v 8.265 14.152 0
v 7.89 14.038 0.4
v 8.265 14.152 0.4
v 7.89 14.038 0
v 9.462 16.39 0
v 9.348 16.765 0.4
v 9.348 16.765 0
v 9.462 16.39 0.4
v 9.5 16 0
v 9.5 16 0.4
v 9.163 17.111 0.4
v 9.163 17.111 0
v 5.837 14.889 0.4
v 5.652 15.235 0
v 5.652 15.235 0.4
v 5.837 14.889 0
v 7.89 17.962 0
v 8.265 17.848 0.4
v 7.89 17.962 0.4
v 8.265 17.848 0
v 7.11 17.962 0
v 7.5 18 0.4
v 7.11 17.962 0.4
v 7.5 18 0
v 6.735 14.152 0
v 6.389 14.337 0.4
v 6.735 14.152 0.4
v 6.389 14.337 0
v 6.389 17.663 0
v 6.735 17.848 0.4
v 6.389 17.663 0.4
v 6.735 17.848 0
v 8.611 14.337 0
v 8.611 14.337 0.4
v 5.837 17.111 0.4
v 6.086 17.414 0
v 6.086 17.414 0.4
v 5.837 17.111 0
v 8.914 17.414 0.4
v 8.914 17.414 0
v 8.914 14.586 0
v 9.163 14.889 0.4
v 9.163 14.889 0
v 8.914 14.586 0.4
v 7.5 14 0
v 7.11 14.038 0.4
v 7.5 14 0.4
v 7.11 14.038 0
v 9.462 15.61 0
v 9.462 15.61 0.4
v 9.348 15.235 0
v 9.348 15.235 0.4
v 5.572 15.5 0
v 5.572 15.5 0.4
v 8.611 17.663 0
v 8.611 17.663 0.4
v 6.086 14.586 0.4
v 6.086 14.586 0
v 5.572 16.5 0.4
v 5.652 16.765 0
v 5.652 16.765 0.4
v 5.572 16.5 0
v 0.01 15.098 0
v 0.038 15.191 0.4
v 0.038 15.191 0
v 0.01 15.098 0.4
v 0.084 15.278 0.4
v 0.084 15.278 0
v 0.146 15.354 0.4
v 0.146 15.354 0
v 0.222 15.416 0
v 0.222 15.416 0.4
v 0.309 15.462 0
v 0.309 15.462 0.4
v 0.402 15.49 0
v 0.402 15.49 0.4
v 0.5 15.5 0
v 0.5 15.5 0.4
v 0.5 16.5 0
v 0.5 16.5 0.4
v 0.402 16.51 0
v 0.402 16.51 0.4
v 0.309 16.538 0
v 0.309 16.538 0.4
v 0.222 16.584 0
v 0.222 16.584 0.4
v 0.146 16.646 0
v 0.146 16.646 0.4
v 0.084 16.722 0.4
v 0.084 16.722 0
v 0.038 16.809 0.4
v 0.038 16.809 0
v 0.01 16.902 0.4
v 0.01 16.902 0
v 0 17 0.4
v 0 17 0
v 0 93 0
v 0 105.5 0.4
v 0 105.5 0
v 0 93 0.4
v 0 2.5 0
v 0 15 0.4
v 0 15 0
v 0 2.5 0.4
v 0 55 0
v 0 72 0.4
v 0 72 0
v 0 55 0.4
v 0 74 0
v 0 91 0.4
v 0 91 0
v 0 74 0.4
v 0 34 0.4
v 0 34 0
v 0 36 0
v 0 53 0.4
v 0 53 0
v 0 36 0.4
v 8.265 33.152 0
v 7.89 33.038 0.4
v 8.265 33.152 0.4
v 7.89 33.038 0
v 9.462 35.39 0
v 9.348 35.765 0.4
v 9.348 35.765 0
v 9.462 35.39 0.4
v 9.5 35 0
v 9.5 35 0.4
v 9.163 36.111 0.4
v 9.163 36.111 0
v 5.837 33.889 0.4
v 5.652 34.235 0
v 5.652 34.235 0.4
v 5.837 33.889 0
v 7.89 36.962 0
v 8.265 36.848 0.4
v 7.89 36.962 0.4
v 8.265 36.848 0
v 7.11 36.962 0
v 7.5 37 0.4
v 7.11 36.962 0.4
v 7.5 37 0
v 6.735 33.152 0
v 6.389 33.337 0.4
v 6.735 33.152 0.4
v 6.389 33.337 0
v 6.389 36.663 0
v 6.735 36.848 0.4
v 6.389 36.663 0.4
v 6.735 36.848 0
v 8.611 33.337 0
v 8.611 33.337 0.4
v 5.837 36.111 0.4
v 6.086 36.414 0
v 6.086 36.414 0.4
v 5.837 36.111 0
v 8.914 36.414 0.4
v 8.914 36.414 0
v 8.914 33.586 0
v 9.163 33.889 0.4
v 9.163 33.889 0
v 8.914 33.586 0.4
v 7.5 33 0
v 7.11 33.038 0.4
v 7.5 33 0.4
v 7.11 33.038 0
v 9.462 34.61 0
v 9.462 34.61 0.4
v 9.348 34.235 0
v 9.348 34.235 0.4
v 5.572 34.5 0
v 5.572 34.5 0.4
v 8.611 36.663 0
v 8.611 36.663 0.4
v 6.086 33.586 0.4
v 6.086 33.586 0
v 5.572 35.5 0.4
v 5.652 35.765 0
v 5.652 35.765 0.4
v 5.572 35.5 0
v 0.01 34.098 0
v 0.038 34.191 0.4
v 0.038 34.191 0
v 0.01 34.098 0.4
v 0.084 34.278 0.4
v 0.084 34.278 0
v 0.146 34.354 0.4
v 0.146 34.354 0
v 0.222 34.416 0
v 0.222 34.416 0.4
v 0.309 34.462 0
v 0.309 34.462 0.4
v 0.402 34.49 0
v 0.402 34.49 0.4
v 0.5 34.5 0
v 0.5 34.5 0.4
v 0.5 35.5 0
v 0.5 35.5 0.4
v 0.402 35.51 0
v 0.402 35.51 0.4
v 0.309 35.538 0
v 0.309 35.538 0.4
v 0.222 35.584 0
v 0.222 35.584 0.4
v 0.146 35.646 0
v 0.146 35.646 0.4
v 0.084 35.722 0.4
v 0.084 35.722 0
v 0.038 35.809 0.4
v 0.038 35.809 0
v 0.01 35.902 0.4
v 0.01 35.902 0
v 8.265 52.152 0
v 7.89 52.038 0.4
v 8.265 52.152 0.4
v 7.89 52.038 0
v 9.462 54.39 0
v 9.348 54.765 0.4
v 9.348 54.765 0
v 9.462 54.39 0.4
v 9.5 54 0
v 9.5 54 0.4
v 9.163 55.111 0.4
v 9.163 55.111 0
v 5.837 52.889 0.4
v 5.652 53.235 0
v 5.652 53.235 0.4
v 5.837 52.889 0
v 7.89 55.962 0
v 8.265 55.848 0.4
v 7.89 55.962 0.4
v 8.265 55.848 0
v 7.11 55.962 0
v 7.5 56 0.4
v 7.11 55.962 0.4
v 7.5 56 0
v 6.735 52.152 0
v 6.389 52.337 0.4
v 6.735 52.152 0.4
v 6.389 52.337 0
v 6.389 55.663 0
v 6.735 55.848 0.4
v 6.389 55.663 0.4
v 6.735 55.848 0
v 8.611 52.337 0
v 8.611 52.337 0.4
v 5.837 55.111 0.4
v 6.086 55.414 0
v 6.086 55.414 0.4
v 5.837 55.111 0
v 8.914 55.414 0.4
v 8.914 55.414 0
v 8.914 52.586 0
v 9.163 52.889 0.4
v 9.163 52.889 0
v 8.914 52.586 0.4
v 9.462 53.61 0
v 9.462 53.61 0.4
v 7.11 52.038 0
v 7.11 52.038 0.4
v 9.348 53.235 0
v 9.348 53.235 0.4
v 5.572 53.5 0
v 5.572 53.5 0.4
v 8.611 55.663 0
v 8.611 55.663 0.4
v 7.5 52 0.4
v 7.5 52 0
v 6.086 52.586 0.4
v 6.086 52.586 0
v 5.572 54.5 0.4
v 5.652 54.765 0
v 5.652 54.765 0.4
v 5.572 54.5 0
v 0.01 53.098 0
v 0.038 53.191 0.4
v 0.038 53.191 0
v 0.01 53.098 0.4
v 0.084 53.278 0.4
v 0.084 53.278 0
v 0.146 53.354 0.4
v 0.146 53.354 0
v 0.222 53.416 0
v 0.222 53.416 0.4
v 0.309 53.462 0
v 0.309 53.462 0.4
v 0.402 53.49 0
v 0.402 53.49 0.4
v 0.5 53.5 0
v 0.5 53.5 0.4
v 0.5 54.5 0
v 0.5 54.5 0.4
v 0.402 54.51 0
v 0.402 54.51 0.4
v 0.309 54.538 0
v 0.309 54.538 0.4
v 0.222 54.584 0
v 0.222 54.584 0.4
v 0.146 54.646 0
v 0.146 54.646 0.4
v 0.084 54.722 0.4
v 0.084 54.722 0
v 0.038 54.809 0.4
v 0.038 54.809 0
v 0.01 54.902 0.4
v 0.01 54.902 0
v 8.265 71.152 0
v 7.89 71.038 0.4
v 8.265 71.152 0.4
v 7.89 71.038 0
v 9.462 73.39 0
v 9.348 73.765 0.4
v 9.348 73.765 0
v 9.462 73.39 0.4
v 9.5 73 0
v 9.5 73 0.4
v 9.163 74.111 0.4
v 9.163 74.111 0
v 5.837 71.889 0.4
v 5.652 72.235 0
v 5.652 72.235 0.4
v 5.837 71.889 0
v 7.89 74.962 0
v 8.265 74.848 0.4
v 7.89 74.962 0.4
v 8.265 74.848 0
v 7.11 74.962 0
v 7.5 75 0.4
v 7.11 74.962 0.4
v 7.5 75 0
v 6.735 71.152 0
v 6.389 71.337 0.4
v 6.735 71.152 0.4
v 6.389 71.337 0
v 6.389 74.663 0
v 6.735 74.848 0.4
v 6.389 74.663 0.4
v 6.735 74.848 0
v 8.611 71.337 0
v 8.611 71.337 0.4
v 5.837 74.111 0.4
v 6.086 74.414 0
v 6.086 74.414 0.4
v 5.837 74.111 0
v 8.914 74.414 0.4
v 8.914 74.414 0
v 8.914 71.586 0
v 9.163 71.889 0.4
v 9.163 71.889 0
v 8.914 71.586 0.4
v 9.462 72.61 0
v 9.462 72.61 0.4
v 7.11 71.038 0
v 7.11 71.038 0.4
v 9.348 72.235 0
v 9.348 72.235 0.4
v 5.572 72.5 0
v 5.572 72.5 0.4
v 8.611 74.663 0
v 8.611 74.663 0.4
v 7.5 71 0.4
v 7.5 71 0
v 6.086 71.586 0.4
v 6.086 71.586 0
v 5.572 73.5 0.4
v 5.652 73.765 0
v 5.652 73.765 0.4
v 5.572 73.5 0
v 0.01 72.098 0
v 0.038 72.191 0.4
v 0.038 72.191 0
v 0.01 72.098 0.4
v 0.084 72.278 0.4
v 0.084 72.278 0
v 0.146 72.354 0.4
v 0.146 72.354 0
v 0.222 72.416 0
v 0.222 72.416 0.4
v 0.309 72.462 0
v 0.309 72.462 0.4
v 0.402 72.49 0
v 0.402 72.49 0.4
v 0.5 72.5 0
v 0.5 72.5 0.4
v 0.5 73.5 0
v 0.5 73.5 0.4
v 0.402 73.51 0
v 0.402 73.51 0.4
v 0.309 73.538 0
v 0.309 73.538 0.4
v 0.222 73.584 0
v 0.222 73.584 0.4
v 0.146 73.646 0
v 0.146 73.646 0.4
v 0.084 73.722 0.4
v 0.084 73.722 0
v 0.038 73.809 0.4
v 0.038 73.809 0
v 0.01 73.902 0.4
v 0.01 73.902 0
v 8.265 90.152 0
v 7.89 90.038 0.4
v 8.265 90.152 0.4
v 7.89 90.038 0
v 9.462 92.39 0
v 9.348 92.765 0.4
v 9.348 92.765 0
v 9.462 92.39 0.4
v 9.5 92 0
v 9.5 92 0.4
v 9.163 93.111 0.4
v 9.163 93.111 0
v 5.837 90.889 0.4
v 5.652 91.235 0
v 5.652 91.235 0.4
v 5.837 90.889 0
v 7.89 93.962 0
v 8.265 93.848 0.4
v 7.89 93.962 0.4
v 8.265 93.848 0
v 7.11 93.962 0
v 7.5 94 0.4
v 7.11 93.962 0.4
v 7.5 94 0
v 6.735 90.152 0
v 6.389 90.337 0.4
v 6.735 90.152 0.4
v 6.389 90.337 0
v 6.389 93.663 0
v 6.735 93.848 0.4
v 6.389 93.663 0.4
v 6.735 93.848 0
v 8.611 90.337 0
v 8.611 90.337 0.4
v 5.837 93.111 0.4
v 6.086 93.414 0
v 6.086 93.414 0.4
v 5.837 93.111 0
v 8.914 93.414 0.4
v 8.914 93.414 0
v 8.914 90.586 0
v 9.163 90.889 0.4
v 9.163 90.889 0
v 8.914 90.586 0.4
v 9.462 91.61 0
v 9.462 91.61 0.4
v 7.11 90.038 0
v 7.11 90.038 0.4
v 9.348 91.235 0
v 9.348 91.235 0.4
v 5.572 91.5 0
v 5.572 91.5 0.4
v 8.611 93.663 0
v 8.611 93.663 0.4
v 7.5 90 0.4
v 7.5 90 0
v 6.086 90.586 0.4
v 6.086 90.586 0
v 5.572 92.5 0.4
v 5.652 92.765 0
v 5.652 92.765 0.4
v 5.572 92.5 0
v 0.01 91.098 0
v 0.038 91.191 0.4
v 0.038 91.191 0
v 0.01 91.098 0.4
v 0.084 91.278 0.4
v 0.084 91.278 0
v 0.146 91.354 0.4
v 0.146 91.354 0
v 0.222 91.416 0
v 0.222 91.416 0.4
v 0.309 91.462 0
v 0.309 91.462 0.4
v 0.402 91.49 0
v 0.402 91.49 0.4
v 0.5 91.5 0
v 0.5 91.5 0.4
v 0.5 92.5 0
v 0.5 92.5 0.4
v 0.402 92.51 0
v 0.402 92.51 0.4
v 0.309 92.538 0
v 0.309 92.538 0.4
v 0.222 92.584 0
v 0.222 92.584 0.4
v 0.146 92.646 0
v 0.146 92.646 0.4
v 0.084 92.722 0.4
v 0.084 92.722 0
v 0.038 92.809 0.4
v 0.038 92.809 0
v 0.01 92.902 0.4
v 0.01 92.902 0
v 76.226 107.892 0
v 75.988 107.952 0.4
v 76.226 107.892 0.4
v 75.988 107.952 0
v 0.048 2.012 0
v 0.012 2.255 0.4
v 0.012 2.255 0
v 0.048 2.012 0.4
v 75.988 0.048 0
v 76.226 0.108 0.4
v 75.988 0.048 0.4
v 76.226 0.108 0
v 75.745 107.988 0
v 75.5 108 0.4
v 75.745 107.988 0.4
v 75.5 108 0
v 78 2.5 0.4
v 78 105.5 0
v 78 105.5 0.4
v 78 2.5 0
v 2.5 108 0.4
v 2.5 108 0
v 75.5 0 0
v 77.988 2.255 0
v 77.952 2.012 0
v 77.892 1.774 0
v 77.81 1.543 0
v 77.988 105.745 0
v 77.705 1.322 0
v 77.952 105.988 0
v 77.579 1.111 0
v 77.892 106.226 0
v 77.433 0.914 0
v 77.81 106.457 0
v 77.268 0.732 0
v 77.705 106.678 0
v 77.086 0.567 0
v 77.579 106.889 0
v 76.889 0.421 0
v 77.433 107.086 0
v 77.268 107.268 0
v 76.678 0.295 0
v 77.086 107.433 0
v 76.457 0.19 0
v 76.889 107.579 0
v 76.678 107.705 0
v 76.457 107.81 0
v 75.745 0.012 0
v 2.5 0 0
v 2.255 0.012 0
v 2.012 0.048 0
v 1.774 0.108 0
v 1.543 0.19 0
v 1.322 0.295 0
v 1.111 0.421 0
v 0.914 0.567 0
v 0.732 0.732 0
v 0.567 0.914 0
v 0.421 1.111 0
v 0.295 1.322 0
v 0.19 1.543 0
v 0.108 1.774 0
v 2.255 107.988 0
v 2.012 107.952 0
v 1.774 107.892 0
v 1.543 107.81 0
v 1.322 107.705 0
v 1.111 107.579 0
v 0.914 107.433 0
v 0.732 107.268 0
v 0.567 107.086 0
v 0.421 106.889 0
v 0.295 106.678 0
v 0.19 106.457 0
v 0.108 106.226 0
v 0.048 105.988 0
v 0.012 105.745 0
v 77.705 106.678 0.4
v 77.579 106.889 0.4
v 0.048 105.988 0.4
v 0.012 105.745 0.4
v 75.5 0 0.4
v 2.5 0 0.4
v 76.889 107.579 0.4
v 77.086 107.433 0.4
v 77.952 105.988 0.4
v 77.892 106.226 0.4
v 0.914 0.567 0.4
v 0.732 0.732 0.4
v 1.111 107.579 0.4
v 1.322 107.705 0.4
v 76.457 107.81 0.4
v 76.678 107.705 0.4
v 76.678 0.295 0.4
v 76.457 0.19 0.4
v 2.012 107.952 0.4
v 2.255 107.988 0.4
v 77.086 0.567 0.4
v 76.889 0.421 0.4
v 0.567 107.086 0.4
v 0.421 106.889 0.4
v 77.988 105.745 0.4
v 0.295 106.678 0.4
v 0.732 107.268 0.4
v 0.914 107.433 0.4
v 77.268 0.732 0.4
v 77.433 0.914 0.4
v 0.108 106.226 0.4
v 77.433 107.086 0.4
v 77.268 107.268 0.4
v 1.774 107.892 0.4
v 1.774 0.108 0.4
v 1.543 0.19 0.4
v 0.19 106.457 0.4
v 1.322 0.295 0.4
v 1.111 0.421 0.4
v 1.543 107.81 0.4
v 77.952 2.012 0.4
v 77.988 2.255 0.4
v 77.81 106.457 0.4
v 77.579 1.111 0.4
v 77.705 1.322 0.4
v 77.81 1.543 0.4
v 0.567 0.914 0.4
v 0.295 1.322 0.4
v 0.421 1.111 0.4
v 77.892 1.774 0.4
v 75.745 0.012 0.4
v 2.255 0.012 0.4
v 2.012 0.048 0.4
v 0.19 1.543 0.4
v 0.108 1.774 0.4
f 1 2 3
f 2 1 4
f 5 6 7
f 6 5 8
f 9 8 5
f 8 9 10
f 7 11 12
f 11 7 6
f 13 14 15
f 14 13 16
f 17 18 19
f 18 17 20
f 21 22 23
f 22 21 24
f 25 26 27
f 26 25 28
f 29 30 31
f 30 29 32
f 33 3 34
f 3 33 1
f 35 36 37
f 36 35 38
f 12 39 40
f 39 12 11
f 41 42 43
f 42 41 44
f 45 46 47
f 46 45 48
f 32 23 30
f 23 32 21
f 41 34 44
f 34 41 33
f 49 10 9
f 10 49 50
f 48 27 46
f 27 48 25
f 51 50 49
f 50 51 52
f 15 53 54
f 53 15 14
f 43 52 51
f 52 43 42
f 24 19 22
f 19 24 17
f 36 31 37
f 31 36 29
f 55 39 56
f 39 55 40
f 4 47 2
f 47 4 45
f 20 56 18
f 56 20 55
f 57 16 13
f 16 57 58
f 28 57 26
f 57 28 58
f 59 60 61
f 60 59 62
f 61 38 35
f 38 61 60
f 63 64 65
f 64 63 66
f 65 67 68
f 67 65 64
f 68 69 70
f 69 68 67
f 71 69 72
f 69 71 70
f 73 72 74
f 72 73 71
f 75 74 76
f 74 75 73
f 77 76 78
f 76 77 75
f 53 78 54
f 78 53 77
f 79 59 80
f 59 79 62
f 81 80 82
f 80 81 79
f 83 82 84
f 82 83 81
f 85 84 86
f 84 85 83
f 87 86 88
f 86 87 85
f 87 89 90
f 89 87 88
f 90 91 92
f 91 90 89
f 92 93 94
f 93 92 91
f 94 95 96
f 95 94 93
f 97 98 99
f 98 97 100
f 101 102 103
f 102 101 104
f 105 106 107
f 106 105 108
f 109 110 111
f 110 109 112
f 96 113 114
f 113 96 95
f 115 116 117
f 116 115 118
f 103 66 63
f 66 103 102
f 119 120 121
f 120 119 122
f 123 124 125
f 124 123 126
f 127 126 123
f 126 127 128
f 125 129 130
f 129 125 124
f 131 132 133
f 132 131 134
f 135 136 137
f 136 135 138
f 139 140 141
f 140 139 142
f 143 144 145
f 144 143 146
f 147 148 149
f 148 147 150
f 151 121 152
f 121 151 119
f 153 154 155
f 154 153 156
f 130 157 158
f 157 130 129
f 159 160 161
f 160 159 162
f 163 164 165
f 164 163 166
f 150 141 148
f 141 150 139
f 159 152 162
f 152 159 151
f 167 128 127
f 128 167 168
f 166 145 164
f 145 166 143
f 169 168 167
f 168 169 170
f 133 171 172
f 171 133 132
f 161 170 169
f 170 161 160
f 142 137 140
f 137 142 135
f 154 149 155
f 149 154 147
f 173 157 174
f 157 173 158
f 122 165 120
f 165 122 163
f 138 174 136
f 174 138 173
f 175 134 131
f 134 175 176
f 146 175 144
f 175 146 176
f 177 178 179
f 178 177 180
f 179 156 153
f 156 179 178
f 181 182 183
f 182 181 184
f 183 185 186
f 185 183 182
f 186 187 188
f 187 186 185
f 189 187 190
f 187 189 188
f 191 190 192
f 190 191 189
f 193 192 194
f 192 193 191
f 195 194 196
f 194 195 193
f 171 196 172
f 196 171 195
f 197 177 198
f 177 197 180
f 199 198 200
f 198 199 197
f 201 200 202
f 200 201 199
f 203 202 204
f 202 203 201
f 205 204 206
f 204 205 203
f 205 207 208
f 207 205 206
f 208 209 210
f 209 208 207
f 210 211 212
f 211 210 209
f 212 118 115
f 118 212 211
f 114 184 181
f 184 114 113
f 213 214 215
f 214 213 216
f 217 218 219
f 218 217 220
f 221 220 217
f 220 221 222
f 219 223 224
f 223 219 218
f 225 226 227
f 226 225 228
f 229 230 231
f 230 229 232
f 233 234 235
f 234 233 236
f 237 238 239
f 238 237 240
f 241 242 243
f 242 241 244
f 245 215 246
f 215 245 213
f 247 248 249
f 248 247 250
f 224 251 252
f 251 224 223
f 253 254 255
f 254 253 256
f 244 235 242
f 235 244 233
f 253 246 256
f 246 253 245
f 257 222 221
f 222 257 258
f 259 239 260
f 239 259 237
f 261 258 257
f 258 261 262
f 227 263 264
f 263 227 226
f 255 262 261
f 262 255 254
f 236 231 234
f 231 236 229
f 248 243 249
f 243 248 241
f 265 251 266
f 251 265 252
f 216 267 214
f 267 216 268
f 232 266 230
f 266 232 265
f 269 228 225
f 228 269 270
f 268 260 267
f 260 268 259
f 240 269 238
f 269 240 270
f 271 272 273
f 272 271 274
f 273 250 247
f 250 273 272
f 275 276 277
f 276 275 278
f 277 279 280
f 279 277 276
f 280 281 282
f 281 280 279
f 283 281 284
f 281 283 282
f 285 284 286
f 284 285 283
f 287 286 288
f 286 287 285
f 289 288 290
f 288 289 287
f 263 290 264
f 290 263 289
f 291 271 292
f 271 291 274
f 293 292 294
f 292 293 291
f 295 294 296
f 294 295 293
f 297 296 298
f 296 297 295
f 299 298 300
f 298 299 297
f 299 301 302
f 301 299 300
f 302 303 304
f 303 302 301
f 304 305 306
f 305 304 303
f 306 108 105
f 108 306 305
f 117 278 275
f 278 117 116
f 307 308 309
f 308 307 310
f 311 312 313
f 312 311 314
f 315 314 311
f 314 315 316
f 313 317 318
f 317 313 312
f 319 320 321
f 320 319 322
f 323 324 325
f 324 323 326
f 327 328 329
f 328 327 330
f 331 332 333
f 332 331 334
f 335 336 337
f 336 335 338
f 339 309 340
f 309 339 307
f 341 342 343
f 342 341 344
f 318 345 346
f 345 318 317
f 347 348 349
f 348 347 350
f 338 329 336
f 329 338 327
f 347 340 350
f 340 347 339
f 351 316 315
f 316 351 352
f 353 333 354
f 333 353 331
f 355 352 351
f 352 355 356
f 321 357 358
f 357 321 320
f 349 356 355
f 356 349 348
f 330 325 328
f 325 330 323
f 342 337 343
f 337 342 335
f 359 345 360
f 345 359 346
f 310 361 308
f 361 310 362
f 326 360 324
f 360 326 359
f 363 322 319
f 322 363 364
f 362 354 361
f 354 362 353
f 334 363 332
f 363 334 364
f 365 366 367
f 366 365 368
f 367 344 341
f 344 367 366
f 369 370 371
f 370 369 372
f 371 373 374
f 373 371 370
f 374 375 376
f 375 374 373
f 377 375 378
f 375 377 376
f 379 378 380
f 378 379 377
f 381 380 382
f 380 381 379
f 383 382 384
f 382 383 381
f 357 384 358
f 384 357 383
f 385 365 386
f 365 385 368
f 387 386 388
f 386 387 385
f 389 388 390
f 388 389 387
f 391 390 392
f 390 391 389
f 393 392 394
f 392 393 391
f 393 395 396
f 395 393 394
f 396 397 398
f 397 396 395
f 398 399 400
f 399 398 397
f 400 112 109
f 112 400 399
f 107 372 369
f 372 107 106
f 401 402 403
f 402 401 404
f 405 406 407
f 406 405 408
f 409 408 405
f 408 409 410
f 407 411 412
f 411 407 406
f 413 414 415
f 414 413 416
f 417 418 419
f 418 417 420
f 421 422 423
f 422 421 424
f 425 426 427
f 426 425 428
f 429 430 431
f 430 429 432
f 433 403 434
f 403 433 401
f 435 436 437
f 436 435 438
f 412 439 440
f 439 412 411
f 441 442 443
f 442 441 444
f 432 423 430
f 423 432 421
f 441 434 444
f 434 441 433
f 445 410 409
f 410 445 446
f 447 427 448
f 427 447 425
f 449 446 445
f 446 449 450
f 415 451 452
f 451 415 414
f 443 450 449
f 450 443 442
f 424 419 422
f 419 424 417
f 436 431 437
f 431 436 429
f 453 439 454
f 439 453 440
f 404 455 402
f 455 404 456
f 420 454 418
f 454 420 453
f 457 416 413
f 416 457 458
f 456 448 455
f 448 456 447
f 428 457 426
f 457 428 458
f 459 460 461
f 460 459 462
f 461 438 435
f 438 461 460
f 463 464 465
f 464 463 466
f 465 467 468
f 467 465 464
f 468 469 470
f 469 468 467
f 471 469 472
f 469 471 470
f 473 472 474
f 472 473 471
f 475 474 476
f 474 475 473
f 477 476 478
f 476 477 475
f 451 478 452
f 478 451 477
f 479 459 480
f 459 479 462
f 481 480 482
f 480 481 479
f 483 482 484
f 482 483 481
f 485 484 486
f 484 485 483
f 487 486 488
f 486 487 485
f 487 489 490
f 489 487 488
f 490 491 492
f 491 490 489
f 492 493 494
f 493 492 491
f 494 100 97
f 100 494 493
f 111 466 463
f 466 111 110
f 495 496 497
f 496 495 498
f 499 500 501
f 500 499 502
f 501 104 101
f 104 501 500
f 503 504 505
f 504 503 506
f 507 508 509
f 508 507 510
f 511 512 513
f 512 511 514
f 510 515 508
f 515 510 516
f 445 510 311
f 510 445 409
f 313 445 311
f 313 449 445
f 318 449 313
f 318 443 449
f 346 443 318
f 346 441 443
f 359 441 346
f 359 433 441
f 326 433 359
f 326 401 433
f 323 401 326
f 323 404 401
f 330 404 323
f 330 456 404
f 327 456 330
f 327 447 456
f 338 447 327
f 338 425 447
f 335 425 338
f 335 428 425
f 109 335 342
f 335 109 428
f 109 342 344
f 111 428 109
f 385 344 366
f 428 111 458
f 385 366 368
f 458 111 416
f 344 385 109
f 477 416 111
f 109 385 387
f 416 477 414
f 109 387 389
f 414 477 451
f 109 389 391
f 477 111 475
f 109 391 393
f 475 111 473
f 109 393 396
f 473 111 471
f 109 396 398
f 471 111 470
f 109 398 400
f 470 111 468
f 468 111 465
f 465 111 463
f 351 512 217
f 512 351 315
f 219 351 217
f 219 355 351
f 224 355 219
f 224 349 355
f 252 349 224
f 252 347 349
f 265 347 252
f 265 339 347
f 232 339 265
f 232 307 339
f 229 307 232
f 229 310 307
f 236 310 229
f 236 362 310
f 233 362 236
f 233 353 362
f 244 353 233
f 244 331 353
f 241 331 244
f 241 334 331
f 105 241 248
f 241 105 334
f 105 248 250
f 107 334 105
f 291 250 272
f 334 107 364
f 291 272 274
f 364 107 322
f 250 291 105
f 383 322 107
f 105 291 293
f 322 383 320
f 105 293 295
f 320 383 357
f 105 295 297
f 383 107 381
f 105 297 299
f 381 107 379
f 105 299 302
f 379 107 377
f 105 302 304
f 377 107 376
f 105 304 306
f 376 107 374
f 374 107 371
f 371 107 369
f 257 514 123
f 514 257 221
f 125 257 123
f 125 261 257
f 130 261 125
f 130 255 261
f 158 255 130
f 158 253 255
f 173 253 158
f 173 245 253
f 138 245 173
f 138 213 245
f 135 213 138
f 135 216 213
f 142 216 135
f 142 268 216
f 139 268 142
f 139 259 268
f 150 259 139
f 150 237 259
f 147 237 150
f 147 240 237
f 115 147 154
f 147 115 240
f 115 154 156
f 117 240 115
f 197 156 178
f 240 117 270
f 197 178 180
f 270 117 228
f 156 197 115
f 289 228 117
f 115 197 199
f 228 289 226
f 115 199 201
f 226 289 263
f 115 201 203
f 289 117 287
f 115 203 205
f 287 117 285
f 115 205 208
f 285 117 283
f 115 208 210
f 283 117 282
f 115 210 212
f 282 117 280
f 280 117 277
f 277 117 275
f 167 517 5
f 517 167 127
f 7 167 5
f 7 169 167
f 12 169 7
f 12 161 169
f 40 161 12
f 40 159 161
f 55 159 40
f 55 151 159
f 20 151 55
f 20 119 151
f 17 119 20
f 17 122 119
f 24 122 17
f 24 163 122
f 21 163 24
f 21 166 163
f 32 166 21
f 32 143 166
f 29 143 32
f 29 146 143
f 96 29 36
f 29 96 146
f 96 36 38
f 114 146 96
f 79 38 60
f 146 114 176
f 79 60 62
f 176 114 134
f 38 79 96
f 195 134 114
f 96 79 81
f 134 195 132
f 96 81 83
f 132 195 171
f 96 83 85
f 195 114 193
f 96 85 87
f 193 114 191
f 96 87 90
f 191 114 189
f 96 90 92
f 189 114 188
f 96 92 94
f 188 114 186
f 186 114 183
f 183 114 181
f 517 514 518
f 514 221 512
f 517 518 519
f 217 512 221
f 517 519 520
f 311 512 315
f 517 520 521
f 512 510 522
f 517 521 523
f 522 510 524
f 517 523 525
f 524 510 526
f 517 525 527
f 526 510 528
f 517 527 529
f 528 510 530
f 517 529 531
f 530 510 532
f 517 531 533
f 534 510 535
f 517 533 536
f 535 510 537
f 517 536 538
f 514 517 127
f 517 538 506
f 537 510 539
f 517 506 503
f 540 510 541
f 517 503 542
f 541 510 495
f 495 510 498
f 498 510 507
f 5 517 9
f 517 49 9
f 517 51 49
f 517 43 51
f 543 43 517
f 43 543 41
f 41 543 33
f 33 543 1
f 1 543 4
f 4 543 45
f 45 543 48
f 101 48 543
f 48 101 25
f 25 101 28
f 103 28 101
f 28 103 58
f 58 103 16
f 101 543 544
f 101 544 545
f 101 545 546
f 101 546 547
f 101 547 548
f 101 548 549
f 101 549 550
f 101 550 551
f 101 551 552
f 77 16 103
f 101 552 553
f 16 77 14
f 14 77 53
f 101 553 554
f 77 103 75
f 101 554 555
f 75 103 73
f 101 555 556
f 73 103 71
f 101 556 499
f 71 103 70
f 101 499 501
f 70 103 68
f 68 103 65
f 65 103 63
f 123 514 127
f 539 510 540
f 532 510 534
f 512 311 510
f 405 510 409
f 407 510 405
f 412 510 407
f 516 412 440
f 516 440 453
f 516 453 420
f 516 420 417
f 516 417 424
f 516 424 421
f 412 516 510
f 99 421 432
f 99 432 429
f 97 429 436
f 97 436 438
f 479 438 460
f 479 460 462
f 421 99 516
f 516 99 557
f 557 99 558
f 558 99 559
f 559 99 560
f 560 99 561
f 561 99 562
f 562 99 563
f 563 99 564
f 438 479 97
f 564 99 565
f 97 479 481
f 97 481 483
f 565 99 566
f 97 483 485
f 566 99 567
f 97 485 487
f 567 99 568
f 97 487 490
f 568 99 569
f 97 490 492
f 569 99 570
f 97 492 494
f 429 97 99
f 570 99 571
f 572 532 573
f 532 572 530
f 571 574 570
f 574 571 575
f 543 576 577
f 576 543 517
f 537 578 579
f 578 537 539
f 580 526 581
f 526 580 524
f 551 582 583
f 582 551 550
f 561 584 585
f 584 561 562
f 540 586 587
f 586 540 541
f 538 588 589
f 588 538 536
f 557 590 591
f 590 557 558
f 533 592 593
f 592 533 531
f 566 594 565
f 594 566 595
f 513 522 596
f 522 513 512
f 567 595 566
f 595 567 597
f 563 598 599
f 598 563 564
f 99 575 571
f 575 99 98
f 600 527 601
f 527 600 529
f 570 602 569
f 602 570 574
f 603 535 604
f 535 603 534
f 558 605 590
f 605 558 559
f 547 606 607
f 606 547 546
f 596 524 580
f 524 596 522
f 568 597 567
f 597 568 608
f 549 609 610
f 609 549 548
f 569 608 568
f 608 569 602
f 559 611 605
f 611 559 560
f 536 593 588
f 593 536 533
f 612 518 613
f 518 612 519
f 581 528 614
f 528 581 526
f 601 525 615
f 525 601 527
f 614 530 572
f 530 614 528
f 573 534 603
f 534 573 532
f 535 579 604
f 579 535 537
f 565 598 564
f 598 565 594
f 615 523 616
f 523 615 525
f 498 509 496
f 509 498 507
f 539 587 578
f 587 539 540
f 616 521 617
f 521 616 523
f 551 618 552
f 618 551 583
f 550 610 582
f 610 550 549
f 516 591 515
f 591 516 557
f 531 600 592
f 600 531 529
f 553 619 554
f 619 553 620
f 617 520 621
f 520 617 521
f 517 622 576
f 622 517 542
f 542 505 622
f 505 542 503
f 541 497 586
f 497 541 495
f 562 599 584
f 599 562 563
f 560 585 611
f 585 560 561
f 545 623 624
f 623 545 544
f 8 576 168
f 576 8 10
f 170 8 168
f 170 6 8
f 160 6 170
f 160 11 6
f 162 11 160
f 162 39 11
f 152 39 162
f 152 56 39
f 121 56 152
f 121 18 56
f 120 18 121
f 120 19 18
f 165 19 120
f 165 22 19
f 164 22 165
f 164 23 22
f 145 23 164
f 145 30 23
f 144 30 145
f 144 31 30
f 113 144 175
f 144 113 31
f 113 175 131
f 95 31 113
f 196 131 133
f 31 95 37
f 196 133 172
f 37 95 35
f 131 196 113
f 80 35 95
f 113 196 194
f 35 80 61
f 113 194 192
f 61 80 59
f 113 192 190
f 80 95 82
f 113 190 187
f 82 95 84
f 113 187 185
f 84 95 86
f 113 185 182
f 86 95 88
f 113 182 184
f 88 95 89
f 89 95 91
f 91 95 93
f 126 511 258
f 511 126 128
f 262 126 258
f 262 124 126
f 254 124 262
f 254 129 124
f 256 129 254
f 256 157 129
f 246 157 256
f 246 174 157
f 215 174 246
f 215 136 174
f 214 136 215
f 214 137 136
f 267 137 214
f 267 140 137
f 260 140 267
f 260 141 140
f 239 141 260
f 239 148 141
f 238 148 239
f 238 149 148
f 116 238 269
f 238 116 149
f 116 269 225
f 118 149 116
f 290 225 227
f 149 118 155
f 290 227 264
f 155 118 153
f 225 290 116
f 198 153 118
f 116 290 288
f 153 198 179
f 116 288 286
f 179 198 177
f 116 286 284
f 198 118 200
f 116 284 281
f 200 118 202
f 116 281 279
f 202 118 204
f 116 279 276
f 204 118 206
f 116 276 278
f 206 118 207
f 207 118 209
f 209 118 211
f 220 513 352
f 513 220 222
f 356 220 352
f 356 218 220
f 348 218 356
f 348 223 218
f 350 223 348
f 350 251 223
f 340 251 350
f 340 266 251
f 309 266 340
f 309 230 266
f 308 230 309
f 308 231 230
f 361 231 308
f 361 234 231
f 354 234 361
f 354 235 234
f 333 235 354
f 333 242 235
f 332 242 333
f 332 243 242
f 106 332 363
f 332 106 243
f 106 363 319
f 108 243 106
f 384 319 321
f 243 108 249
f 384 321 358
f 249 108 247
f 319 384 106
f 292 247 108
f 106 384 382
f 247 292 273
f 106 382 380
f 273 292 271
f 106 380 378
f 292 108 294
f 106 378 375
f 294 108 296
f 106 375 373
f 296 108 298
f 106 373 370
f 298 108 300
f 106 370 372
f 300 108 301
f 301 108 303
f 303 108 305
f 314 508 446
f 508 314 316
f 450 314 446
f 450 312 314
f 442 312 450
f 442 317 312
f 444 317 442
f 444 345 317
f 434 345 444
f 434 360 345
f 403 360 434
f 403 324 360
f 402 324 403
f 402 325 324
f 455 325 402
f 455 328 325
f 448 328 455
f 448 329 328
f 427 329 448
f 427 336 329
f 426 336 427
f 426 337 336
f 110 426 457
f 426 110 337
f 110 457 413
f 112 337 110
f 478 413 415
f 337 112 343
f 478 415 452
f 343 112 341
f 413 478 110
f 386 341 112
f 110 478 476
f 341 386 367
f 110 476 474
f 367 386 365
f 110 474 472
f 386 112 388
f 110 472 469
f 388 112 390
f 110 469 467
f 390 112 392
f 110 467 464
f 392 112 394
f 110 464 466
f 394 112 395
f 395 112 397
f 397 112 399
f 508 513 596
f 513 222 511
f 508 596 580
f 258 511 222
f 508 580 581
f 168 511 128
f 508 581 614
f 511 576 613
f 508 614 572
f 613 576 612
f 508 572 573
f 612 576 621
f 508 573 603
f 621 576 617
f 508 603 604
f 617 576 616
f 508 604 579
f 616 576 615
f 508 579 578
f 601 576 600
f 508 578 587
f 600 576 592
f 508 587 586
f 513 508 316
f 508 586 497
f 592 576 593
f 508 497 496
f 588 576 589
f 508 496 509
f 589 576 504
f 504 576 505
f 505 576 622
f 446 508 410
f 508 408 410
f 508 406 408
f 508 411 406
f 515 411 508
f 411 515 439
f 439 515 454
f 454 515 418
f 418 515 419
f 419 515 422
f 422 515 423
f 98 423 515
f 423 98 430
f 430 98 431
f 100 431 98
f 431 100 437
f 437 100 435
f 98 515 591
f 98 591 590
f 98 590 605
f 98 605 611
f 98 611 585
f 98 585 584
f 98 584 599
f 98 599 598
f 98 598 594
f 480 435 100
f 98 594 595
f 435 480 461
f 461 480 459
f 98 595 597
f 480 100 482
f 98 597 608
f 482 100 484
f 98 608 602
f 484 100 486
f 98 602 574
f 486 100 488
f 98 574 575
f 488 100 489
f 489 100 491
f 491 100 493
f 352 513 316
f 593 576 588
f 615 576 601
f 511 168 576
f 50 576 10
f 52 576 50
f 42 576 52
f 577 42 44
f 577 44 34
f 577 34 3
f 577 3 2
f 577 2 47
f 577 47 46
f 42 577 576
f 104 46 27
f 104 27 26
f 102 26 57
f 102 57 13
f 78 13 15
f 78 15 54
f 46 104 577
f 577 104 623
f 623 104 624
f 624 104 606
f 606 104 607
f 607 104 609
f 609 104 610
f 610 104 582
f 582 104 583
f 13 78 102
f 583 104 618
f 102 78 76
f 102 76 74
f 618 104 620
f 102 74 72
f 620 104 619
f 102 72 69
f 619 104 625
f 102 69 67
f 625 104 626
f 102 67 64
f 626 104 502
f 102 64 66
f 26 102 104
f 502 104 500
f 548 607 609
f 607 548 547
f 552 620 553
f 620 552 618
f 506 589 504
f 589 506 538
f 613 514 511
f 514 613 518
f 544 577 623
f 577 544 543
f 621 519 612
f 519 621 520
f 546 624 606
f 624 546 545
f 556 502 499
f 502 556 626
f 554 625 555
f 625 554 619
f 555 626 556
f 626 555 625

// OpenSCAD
// Tabbed Divider for Filofax-style Notebooks
// Based on specifications from Tabbed_Divider.md

// --- Part Selection ---
// Choose which part to display. For multi-color printing, export "divider" 
// and "ruler" individually and import them as parts of a single object
// in your slicer software.
part_to_show = "all"; // ["all", "divider", "ruler"]

// --- Parameters ---

// Width of the main divider in mm
divider_width = 78; // [15:1:200]
// Height of the main divider in mm
divider_height = 108; // [80:1:300]
// Thickness of the divider material in mm
divider_depth = 0.4; // [0.2:0.2:2.0]
// Radius for the main body corners in mm
divider_radius = 2.5; // [0:0.1:10]

// Number of holes for binder rings
hole_count = 5; // [1:1:10]
// Diameter of the holes in mm
hole_diameter = 4; // [2:0.1:10]
// Spacing between hole centers in mm
hole_spacing = 19; // [5:0.1:30]
// Distance from the left edge to the hole centers in mm
hole_edge_distance = 7.5; // [2:0.1:20]

// Width of the channel from hole to edge in mm. 0 to disable.
hole_channel_width = 1; // [0:0.1:10]

// Type of tab to generate (off, right, or top)
tab_type = "off"; // ["off", "right", "top"]
// Length of the tab along the divider's height or width in mm
tab_length = 50; // [10:1:100]
// How far the tab protrudes from the divider edge in mm
tab_protrusion = 10; // [5:1:30]
// Offset from the top edge (for "right" tab) or left edge (for "top" tab) of the divider in mm
tab_offset = 5; // [0:1:100]
// Inward angle of the tab's tapered sides in degrees
tab_taper_angle = 75;      // [0:1:90]
// Radius for the tab's outer corners in mm
tab_outer_radius = 2.5;    // [0:0.1:10]


// --- Ruler Parameters ---
// Position of the ruler ("off", "top", or "right" edge)
ruler_position = "off"; // ["off", "top", "right"]
// Distance from the edge to the ruler marks' baseline.
ruler_offset = 5; // [0:0.5:20]
// Depth of the ruler marks inlay in mm. For multi-color printing.
ruler_mark_depth = 0.2; // [0.1:0.1:1]
// Width of each tick mark in mm.
ruler_tick_width = 0.4; // [0.2:0.1:2]
// Length of major tick marks (e.g., every 10mm).
ruler_major_tick_length = 10; // [5:1:20]
// Length of minor tick marks (e.g., every 1mm).
ruler_minor_tick_length = 5; // [2:1:10]
// Spacing for major ticks (e.g., 10 for cm).
ruler_major_tick_spacing = 10; // [5:1:20]
// Spacing for minor ticks (e.g., 1 for mm).
ruler_minor_tick_spacing = 1; // [1:1:10]
// Display numbers on major ticks.
ruler_show_numbers = true; // [true, false]
// Add a ruler to the backside of the divider.
ruler_on_backside = false; // [true, false]
// Font size for ruler numbers.
ruler_font_size = 5; // [4:1:12]
// Font for the numbers
ruler_font = "Liberation Sans"; //
// Offset of the numbers from the major ticks.
ruler_number_offset = 2; // [1:0.5:10]


// --- Helper Modules ---

// Creates a 2D rectangle with rounded corners
module rounded_rectangle(size, r) {
    w = size[0];
    h = size[1];
    $fn=64;
    hull() {
        translate([r, r]) circle(r = r);
        translate([w - r, r]) circle(r = r);
        translate([r, h - r]) circle(r = r);
        translate([w - r, h - r]) circle(r = r);
    }
}


// --- Ruler Components ---

// Generates the 2D geometry for the ruler marks.
module ruler_marks_2d() {
    if (ruler_position != "off") {
        if (ruler_position == "top") {
            // Ruler along the top edge
            // Note: May overlap with a "top" tab. Adjust ruler_offset or tab_offset.
            translate([0, divider_height - ruler_offset, 0]) {
                for (x = [0 : ruler_minor_tick_spacing : divider_width - ruler_tick_width]) {
                    is_major_tick = (x % ruler_major_tick_spacing == 0);
                    tick_len = is_major_tick ? ruler_major_tick_length : ruler_minor_tick_length;

                    // Draw tick mark
                    translate([x, -tick_len, 0]) {
                        square([ruler_tick_width, tick_len]);
                    }

                    // Draw number for major ticks
                    if (is_major_tick && ruler_show_numbers && x > 0) {
                        number_text = str(x / ruler_major_tick_spacing);
                        translate([x + ruler_tick_width / 2, -tick_len - ruler_number_offset, 0]) {
                            text(number_text, size = ruler_font_size, font = ruler_font, halign = "center", valign = "top");
                        }
                    }
                }
            }
        } else if (ruler_position == "right") {
            // Ruler along the right edge
            // Note: May overlap with a "right" tab. Adjust ruler_offset or tab_offset.
            translate([divider_width - ruler_offset, 0, 0]) {
                for (y = [0 : ruler_minor_tick_spacing : divider_height - ruler_tick_width]) {
                    is_major_tick = (y % ruler_major_tick_spacing == 0);
                    tick_len = is_major_tick ? ruler_major_tick_length : ruler_minor_tick_length;
                    
                    // Draw tick mark
                    translate([-tick_len, y, 0]) {
                        square([tick_len, ruler_tick_width]);
                    }

                    // Draw number for major ticks
                    if (is_major_tick && ruler_show_numbers && y > 0) {
                        number_text = str(y / ruler_major_tick_spacing);
                        translate([-tick_len - ruler_number_offset, y + ruler_tick_width / 2, 0]) {
                            text(number_text, size = ruler_font_size, font = ruler_font, halign = "right", valign = "center");
                        }
                    }
                }
            }
        }
    }
}

// Generates the 2D geometry for the ruler marks on the backside.
module ruler_marks_2d_backside() {
    if (ruler_position != "off") {
        if (ruler_position == "top") {
            // Ruler along the top edge, for the backside view
            // To make numbers read correctly from the back, we rotate the text
            translate([0, divider_height - ruler_offset, 0]) {
                for (x = [0 : ruler_minor_tick_spacing : divider_width - ruler_tick_width]) {
                    is_major_tick = (x % ruler_major_tick_spacing == 0);
                    tick_len = is_major_tick ? ruler_major_tick_length : ruler_minor_tick_length;

                    // Draw tick mark (same position as front, but effectively on the other side of the divider)
                    translate([x, -tick_len, 0]) {
                        square([ruler_tick_width, tick_len]);
                    }

                    // Draw number for major ticks
                    if (is_major_tick && ruler_show_numbers && x > 0) {
                        number_text = str(x / ruler_major_tick_spacing);
                        // Rotate 180 degrees around x-axis and translate for correct display from back
                        translate([x + ruler_tick_width / 2, -tick_len - ruler_number_offset, 0]) {
                             rotate([180, 0, 0]) { // Flip upside down
                                text(number_text, size = ruler_font_size, font = ruler_font, halign = "center", valign = "bottom");
                            }
                        }
                    }
                }
            }
        } else if (ruler_position == "right") {
            // Ruler along the right edge, for the backside view
            // To make numbers read correctly from the back, we rotate the text
            translate([divider_width - ruler_offset, 0, 0]) {
                for (y = [0 : ruler_minor_tick_spacing : divider_height - ruler_tick_width]) {
                    is_major_tick = (y % ruler_major_tick_spacing == 0);
                    tick_len = is_major_tick ? ruler_major_tick_length : ruler_minor_tick_length;
                    
                    // Draw tick mark (same position as front, but effectively on the other side of the divider)
                    translate([-tick_len, y, 0]) {
                        square([tick_len, ruler_tick_width]);
                    }

                    // Draw number for major ticks
                    if (is_major_tick && ruler_show_numbers && y > 0) {
                        number_text = str(y / ruler_major_tick_spacing);
                        // Rotate 180 degrees around y-axis and translate for correct display from back
                        translate([-tick_len - ruler_number_offset, y + ruler_tick_width / 2, 0]) {
                            rotate([0, 180, 0]) { // Flip horizontally
                                text(number_text, size = ruler_font_size, font = ruler_font, halign = "left", valign = "center");
                            }
                        }
                    }
                }
            }
        }
    }
}


// --- Main Components ---

module body() {
    linear_extrude(height = divider_depth) {
        rounded_rectangle([divider_width, divider_height], divider_radius);
    }
}

module tab() {
    if (tab_type != "off") {
        r = tab_outer_radius;

        // Ensure dimensions don't become negative if radius is too large
        // (w_inner and h_inner calculated differently for 'right' and 'top' tabs)
        
        if (tab_type == "right") {
            // Right tab logic
            w_inner = tab_protrusion - r;
            h_inner = tab_length - (2 * r);
            
            if (w_inner > 0 && h_inner > 0) {
                taper_offset_inner = w_inner / tan(tab_taper_angle);

                // Define the core tapered shape, offset by 'r' on the y-axis
                tab_points = [
                    [0, r],
                    [0, r + h_inner],
                    [w_inner, r + h_inner - taper_offset_inner],
                    [w_inner, r + taper_offset_inner]
                ];

                // Position the final tab shape relative to the main body
                translate([divider_width, divider_height - tab_length - tab_offset, 0]) {
                    linear_extrude(height = divider_depth) {
                        difference() {
                            minkowski($fn=64) {
                                polygon(tab_points);
                                circle(r = r);
                            }
                            cutter_width = r + 1; // Must be wider than the radius
                            cutter_height = tab_length + 2; // Must be taller than the final shape
                            translate([-cutter_width, -1]) {
                                square([cutter_width, cutter_height]);
                            }
                        }
                    }
                }
            }
        } else if (tab_type == "top") {
            // Top tab logic
            // w_inner will be along divider_width, h_inner along divider_height
            w_inner = tab_length - (2 * r); // tab_length is now along width
            h_inner = tab_protrusion - r; // tab_protrusion is now along height

            if (w_inner > 0 && h_inner > 0) {
                taper_offset_inner = h_inner / tan(tab_taper_angle); // Taper along y-axis now

                // Define the core tapered shape, offset by 'r' on the x-axis
                tab_points = [
                    [r, 0],
                    [r + w_inner, 0],
                    [r + w_inner - taper_offset_inner, h_inner],
                    [r + taper_offset_inner, h_inner]
                ];
                
                // Position the final tab shape relative to the main body
                translate([tab_offset, divider_height, 0]) {
                    linear_extrude(height = divider_depth) {
                        difference() {
                            minkowski($fn=64) {
                                polygon(tab_points);
                                circle(r = r);
                            }
                            cutter_width = tab_length + 2; // Must be taller than the final shape
                            cutter_height = r + 1; // Must be wider than the radius
                            translate([-1, -cutter_height]) {
                                square([cutter_width, cutter_height]);
                            }
                        }
                    }
                }
            }
        }
    }
}

// The punch holes for the binder rings
module holes() {
    // Center the group of holes vertically on the divider
    total_hole_span = (hole_count - 1) * hole_spacing;
    y_start = (divider_height - total_hole_span) / 2;
    
    hole_cylinder_height = divider_depth + 2; 

    for (i = [0:hole_count-1]) {
        y_pos = y_start + i * hole_spacing;
        
        // The hole itself
        translate([hole_edge_distance, y_pos, -1]) {
            cylinder(h = hole_cylinder_height, d = hole_diameter, $fn=32);
        }

        // Optional channel from hole to the edge with rounded corners
        if (hole_channel_width > 0) {
            r = hole_channel_width / 2; // Rounding radius, as specified
            
            translate([0, y_pos - r, -1]) { // Position the channel cutter relative to the hole's y_pos
                linear_extrude(height = hole_cylinder_height) {
                    union() {
                        // The main rectangular part of the channel cutter
                        square([hole_edge_distance, hole_channel_width]);

                        // Bottom-left corner rounding cutter:
                        // This shape is an r x r square MINUS a quarter circle.
                        // When subtracted from the main body, it creates a convex quarter-circle fillet.
                        translate([0, -r]) { // Position at bottom-left of the current channel segment
                            difference() {
                                square([r, r]); // The r x r square part
                                // The quarter circle that is "added back" (subtracted from the square)
                                translate([r, 0]) circle(r = r, $fn=32);
                            }
                        }

                        // Top-left corner rounding cutter:
                        // Similar logic for the top corner.
                        translate([0, hole_channel_width ]) { // Position at top-left of the current channel segment
                            difference() {
                                square([r, r]); // The r x r square part
                                // The quarter circle that is "added back" (subtracted from the square)
                                translate([r, r]) circle(r = r, $fn=32);
                            }
                        }
                    }
                }
            }
        }
    }
}


// --- Final Assembly ---

// This module creates the main divider with holes and cutouts for the ruler.
module divider_main() {
    difference() {
        union() {
            body();
            tab();
        }
        holes();
        

    }
}

// This module creates only the ruler inlay part.
module ruler_inlay() {
    if (ruler_position != "off") {
        translate([0, 0, divider_depth - ruler_mark_depth]) {
            linear_extrude(height = ruler_mark_depth) {
                ruler_marks_2d();
            }
        }
        if (ruler_on_backside) {
            translate([0, 0, 0]) { // Start at z=0 (bottom surface)
                linear_extrude(height = ruler_mark_depth) { // Extrude upwards
                    ruler_marks_2d_backside();
                }
            }
        }
    }
}

// Render the selected part(s). For multi-color printing, you must export
// "divider" and "ruler" as separate files (e.g. STL) and then import them as
// parts of a single object in your slicer software (like BambuStudio).
// The "all" view is for preview purposes only.
if (part_to_show == "divider") {
    divider_main();
} else if (part_to_show == "ruler") {
    ruler_inlay();
} else { // "all"
    color("black") {
        divider_main();
    }
    color("white") {
        ruler_inlay();
    }
}
